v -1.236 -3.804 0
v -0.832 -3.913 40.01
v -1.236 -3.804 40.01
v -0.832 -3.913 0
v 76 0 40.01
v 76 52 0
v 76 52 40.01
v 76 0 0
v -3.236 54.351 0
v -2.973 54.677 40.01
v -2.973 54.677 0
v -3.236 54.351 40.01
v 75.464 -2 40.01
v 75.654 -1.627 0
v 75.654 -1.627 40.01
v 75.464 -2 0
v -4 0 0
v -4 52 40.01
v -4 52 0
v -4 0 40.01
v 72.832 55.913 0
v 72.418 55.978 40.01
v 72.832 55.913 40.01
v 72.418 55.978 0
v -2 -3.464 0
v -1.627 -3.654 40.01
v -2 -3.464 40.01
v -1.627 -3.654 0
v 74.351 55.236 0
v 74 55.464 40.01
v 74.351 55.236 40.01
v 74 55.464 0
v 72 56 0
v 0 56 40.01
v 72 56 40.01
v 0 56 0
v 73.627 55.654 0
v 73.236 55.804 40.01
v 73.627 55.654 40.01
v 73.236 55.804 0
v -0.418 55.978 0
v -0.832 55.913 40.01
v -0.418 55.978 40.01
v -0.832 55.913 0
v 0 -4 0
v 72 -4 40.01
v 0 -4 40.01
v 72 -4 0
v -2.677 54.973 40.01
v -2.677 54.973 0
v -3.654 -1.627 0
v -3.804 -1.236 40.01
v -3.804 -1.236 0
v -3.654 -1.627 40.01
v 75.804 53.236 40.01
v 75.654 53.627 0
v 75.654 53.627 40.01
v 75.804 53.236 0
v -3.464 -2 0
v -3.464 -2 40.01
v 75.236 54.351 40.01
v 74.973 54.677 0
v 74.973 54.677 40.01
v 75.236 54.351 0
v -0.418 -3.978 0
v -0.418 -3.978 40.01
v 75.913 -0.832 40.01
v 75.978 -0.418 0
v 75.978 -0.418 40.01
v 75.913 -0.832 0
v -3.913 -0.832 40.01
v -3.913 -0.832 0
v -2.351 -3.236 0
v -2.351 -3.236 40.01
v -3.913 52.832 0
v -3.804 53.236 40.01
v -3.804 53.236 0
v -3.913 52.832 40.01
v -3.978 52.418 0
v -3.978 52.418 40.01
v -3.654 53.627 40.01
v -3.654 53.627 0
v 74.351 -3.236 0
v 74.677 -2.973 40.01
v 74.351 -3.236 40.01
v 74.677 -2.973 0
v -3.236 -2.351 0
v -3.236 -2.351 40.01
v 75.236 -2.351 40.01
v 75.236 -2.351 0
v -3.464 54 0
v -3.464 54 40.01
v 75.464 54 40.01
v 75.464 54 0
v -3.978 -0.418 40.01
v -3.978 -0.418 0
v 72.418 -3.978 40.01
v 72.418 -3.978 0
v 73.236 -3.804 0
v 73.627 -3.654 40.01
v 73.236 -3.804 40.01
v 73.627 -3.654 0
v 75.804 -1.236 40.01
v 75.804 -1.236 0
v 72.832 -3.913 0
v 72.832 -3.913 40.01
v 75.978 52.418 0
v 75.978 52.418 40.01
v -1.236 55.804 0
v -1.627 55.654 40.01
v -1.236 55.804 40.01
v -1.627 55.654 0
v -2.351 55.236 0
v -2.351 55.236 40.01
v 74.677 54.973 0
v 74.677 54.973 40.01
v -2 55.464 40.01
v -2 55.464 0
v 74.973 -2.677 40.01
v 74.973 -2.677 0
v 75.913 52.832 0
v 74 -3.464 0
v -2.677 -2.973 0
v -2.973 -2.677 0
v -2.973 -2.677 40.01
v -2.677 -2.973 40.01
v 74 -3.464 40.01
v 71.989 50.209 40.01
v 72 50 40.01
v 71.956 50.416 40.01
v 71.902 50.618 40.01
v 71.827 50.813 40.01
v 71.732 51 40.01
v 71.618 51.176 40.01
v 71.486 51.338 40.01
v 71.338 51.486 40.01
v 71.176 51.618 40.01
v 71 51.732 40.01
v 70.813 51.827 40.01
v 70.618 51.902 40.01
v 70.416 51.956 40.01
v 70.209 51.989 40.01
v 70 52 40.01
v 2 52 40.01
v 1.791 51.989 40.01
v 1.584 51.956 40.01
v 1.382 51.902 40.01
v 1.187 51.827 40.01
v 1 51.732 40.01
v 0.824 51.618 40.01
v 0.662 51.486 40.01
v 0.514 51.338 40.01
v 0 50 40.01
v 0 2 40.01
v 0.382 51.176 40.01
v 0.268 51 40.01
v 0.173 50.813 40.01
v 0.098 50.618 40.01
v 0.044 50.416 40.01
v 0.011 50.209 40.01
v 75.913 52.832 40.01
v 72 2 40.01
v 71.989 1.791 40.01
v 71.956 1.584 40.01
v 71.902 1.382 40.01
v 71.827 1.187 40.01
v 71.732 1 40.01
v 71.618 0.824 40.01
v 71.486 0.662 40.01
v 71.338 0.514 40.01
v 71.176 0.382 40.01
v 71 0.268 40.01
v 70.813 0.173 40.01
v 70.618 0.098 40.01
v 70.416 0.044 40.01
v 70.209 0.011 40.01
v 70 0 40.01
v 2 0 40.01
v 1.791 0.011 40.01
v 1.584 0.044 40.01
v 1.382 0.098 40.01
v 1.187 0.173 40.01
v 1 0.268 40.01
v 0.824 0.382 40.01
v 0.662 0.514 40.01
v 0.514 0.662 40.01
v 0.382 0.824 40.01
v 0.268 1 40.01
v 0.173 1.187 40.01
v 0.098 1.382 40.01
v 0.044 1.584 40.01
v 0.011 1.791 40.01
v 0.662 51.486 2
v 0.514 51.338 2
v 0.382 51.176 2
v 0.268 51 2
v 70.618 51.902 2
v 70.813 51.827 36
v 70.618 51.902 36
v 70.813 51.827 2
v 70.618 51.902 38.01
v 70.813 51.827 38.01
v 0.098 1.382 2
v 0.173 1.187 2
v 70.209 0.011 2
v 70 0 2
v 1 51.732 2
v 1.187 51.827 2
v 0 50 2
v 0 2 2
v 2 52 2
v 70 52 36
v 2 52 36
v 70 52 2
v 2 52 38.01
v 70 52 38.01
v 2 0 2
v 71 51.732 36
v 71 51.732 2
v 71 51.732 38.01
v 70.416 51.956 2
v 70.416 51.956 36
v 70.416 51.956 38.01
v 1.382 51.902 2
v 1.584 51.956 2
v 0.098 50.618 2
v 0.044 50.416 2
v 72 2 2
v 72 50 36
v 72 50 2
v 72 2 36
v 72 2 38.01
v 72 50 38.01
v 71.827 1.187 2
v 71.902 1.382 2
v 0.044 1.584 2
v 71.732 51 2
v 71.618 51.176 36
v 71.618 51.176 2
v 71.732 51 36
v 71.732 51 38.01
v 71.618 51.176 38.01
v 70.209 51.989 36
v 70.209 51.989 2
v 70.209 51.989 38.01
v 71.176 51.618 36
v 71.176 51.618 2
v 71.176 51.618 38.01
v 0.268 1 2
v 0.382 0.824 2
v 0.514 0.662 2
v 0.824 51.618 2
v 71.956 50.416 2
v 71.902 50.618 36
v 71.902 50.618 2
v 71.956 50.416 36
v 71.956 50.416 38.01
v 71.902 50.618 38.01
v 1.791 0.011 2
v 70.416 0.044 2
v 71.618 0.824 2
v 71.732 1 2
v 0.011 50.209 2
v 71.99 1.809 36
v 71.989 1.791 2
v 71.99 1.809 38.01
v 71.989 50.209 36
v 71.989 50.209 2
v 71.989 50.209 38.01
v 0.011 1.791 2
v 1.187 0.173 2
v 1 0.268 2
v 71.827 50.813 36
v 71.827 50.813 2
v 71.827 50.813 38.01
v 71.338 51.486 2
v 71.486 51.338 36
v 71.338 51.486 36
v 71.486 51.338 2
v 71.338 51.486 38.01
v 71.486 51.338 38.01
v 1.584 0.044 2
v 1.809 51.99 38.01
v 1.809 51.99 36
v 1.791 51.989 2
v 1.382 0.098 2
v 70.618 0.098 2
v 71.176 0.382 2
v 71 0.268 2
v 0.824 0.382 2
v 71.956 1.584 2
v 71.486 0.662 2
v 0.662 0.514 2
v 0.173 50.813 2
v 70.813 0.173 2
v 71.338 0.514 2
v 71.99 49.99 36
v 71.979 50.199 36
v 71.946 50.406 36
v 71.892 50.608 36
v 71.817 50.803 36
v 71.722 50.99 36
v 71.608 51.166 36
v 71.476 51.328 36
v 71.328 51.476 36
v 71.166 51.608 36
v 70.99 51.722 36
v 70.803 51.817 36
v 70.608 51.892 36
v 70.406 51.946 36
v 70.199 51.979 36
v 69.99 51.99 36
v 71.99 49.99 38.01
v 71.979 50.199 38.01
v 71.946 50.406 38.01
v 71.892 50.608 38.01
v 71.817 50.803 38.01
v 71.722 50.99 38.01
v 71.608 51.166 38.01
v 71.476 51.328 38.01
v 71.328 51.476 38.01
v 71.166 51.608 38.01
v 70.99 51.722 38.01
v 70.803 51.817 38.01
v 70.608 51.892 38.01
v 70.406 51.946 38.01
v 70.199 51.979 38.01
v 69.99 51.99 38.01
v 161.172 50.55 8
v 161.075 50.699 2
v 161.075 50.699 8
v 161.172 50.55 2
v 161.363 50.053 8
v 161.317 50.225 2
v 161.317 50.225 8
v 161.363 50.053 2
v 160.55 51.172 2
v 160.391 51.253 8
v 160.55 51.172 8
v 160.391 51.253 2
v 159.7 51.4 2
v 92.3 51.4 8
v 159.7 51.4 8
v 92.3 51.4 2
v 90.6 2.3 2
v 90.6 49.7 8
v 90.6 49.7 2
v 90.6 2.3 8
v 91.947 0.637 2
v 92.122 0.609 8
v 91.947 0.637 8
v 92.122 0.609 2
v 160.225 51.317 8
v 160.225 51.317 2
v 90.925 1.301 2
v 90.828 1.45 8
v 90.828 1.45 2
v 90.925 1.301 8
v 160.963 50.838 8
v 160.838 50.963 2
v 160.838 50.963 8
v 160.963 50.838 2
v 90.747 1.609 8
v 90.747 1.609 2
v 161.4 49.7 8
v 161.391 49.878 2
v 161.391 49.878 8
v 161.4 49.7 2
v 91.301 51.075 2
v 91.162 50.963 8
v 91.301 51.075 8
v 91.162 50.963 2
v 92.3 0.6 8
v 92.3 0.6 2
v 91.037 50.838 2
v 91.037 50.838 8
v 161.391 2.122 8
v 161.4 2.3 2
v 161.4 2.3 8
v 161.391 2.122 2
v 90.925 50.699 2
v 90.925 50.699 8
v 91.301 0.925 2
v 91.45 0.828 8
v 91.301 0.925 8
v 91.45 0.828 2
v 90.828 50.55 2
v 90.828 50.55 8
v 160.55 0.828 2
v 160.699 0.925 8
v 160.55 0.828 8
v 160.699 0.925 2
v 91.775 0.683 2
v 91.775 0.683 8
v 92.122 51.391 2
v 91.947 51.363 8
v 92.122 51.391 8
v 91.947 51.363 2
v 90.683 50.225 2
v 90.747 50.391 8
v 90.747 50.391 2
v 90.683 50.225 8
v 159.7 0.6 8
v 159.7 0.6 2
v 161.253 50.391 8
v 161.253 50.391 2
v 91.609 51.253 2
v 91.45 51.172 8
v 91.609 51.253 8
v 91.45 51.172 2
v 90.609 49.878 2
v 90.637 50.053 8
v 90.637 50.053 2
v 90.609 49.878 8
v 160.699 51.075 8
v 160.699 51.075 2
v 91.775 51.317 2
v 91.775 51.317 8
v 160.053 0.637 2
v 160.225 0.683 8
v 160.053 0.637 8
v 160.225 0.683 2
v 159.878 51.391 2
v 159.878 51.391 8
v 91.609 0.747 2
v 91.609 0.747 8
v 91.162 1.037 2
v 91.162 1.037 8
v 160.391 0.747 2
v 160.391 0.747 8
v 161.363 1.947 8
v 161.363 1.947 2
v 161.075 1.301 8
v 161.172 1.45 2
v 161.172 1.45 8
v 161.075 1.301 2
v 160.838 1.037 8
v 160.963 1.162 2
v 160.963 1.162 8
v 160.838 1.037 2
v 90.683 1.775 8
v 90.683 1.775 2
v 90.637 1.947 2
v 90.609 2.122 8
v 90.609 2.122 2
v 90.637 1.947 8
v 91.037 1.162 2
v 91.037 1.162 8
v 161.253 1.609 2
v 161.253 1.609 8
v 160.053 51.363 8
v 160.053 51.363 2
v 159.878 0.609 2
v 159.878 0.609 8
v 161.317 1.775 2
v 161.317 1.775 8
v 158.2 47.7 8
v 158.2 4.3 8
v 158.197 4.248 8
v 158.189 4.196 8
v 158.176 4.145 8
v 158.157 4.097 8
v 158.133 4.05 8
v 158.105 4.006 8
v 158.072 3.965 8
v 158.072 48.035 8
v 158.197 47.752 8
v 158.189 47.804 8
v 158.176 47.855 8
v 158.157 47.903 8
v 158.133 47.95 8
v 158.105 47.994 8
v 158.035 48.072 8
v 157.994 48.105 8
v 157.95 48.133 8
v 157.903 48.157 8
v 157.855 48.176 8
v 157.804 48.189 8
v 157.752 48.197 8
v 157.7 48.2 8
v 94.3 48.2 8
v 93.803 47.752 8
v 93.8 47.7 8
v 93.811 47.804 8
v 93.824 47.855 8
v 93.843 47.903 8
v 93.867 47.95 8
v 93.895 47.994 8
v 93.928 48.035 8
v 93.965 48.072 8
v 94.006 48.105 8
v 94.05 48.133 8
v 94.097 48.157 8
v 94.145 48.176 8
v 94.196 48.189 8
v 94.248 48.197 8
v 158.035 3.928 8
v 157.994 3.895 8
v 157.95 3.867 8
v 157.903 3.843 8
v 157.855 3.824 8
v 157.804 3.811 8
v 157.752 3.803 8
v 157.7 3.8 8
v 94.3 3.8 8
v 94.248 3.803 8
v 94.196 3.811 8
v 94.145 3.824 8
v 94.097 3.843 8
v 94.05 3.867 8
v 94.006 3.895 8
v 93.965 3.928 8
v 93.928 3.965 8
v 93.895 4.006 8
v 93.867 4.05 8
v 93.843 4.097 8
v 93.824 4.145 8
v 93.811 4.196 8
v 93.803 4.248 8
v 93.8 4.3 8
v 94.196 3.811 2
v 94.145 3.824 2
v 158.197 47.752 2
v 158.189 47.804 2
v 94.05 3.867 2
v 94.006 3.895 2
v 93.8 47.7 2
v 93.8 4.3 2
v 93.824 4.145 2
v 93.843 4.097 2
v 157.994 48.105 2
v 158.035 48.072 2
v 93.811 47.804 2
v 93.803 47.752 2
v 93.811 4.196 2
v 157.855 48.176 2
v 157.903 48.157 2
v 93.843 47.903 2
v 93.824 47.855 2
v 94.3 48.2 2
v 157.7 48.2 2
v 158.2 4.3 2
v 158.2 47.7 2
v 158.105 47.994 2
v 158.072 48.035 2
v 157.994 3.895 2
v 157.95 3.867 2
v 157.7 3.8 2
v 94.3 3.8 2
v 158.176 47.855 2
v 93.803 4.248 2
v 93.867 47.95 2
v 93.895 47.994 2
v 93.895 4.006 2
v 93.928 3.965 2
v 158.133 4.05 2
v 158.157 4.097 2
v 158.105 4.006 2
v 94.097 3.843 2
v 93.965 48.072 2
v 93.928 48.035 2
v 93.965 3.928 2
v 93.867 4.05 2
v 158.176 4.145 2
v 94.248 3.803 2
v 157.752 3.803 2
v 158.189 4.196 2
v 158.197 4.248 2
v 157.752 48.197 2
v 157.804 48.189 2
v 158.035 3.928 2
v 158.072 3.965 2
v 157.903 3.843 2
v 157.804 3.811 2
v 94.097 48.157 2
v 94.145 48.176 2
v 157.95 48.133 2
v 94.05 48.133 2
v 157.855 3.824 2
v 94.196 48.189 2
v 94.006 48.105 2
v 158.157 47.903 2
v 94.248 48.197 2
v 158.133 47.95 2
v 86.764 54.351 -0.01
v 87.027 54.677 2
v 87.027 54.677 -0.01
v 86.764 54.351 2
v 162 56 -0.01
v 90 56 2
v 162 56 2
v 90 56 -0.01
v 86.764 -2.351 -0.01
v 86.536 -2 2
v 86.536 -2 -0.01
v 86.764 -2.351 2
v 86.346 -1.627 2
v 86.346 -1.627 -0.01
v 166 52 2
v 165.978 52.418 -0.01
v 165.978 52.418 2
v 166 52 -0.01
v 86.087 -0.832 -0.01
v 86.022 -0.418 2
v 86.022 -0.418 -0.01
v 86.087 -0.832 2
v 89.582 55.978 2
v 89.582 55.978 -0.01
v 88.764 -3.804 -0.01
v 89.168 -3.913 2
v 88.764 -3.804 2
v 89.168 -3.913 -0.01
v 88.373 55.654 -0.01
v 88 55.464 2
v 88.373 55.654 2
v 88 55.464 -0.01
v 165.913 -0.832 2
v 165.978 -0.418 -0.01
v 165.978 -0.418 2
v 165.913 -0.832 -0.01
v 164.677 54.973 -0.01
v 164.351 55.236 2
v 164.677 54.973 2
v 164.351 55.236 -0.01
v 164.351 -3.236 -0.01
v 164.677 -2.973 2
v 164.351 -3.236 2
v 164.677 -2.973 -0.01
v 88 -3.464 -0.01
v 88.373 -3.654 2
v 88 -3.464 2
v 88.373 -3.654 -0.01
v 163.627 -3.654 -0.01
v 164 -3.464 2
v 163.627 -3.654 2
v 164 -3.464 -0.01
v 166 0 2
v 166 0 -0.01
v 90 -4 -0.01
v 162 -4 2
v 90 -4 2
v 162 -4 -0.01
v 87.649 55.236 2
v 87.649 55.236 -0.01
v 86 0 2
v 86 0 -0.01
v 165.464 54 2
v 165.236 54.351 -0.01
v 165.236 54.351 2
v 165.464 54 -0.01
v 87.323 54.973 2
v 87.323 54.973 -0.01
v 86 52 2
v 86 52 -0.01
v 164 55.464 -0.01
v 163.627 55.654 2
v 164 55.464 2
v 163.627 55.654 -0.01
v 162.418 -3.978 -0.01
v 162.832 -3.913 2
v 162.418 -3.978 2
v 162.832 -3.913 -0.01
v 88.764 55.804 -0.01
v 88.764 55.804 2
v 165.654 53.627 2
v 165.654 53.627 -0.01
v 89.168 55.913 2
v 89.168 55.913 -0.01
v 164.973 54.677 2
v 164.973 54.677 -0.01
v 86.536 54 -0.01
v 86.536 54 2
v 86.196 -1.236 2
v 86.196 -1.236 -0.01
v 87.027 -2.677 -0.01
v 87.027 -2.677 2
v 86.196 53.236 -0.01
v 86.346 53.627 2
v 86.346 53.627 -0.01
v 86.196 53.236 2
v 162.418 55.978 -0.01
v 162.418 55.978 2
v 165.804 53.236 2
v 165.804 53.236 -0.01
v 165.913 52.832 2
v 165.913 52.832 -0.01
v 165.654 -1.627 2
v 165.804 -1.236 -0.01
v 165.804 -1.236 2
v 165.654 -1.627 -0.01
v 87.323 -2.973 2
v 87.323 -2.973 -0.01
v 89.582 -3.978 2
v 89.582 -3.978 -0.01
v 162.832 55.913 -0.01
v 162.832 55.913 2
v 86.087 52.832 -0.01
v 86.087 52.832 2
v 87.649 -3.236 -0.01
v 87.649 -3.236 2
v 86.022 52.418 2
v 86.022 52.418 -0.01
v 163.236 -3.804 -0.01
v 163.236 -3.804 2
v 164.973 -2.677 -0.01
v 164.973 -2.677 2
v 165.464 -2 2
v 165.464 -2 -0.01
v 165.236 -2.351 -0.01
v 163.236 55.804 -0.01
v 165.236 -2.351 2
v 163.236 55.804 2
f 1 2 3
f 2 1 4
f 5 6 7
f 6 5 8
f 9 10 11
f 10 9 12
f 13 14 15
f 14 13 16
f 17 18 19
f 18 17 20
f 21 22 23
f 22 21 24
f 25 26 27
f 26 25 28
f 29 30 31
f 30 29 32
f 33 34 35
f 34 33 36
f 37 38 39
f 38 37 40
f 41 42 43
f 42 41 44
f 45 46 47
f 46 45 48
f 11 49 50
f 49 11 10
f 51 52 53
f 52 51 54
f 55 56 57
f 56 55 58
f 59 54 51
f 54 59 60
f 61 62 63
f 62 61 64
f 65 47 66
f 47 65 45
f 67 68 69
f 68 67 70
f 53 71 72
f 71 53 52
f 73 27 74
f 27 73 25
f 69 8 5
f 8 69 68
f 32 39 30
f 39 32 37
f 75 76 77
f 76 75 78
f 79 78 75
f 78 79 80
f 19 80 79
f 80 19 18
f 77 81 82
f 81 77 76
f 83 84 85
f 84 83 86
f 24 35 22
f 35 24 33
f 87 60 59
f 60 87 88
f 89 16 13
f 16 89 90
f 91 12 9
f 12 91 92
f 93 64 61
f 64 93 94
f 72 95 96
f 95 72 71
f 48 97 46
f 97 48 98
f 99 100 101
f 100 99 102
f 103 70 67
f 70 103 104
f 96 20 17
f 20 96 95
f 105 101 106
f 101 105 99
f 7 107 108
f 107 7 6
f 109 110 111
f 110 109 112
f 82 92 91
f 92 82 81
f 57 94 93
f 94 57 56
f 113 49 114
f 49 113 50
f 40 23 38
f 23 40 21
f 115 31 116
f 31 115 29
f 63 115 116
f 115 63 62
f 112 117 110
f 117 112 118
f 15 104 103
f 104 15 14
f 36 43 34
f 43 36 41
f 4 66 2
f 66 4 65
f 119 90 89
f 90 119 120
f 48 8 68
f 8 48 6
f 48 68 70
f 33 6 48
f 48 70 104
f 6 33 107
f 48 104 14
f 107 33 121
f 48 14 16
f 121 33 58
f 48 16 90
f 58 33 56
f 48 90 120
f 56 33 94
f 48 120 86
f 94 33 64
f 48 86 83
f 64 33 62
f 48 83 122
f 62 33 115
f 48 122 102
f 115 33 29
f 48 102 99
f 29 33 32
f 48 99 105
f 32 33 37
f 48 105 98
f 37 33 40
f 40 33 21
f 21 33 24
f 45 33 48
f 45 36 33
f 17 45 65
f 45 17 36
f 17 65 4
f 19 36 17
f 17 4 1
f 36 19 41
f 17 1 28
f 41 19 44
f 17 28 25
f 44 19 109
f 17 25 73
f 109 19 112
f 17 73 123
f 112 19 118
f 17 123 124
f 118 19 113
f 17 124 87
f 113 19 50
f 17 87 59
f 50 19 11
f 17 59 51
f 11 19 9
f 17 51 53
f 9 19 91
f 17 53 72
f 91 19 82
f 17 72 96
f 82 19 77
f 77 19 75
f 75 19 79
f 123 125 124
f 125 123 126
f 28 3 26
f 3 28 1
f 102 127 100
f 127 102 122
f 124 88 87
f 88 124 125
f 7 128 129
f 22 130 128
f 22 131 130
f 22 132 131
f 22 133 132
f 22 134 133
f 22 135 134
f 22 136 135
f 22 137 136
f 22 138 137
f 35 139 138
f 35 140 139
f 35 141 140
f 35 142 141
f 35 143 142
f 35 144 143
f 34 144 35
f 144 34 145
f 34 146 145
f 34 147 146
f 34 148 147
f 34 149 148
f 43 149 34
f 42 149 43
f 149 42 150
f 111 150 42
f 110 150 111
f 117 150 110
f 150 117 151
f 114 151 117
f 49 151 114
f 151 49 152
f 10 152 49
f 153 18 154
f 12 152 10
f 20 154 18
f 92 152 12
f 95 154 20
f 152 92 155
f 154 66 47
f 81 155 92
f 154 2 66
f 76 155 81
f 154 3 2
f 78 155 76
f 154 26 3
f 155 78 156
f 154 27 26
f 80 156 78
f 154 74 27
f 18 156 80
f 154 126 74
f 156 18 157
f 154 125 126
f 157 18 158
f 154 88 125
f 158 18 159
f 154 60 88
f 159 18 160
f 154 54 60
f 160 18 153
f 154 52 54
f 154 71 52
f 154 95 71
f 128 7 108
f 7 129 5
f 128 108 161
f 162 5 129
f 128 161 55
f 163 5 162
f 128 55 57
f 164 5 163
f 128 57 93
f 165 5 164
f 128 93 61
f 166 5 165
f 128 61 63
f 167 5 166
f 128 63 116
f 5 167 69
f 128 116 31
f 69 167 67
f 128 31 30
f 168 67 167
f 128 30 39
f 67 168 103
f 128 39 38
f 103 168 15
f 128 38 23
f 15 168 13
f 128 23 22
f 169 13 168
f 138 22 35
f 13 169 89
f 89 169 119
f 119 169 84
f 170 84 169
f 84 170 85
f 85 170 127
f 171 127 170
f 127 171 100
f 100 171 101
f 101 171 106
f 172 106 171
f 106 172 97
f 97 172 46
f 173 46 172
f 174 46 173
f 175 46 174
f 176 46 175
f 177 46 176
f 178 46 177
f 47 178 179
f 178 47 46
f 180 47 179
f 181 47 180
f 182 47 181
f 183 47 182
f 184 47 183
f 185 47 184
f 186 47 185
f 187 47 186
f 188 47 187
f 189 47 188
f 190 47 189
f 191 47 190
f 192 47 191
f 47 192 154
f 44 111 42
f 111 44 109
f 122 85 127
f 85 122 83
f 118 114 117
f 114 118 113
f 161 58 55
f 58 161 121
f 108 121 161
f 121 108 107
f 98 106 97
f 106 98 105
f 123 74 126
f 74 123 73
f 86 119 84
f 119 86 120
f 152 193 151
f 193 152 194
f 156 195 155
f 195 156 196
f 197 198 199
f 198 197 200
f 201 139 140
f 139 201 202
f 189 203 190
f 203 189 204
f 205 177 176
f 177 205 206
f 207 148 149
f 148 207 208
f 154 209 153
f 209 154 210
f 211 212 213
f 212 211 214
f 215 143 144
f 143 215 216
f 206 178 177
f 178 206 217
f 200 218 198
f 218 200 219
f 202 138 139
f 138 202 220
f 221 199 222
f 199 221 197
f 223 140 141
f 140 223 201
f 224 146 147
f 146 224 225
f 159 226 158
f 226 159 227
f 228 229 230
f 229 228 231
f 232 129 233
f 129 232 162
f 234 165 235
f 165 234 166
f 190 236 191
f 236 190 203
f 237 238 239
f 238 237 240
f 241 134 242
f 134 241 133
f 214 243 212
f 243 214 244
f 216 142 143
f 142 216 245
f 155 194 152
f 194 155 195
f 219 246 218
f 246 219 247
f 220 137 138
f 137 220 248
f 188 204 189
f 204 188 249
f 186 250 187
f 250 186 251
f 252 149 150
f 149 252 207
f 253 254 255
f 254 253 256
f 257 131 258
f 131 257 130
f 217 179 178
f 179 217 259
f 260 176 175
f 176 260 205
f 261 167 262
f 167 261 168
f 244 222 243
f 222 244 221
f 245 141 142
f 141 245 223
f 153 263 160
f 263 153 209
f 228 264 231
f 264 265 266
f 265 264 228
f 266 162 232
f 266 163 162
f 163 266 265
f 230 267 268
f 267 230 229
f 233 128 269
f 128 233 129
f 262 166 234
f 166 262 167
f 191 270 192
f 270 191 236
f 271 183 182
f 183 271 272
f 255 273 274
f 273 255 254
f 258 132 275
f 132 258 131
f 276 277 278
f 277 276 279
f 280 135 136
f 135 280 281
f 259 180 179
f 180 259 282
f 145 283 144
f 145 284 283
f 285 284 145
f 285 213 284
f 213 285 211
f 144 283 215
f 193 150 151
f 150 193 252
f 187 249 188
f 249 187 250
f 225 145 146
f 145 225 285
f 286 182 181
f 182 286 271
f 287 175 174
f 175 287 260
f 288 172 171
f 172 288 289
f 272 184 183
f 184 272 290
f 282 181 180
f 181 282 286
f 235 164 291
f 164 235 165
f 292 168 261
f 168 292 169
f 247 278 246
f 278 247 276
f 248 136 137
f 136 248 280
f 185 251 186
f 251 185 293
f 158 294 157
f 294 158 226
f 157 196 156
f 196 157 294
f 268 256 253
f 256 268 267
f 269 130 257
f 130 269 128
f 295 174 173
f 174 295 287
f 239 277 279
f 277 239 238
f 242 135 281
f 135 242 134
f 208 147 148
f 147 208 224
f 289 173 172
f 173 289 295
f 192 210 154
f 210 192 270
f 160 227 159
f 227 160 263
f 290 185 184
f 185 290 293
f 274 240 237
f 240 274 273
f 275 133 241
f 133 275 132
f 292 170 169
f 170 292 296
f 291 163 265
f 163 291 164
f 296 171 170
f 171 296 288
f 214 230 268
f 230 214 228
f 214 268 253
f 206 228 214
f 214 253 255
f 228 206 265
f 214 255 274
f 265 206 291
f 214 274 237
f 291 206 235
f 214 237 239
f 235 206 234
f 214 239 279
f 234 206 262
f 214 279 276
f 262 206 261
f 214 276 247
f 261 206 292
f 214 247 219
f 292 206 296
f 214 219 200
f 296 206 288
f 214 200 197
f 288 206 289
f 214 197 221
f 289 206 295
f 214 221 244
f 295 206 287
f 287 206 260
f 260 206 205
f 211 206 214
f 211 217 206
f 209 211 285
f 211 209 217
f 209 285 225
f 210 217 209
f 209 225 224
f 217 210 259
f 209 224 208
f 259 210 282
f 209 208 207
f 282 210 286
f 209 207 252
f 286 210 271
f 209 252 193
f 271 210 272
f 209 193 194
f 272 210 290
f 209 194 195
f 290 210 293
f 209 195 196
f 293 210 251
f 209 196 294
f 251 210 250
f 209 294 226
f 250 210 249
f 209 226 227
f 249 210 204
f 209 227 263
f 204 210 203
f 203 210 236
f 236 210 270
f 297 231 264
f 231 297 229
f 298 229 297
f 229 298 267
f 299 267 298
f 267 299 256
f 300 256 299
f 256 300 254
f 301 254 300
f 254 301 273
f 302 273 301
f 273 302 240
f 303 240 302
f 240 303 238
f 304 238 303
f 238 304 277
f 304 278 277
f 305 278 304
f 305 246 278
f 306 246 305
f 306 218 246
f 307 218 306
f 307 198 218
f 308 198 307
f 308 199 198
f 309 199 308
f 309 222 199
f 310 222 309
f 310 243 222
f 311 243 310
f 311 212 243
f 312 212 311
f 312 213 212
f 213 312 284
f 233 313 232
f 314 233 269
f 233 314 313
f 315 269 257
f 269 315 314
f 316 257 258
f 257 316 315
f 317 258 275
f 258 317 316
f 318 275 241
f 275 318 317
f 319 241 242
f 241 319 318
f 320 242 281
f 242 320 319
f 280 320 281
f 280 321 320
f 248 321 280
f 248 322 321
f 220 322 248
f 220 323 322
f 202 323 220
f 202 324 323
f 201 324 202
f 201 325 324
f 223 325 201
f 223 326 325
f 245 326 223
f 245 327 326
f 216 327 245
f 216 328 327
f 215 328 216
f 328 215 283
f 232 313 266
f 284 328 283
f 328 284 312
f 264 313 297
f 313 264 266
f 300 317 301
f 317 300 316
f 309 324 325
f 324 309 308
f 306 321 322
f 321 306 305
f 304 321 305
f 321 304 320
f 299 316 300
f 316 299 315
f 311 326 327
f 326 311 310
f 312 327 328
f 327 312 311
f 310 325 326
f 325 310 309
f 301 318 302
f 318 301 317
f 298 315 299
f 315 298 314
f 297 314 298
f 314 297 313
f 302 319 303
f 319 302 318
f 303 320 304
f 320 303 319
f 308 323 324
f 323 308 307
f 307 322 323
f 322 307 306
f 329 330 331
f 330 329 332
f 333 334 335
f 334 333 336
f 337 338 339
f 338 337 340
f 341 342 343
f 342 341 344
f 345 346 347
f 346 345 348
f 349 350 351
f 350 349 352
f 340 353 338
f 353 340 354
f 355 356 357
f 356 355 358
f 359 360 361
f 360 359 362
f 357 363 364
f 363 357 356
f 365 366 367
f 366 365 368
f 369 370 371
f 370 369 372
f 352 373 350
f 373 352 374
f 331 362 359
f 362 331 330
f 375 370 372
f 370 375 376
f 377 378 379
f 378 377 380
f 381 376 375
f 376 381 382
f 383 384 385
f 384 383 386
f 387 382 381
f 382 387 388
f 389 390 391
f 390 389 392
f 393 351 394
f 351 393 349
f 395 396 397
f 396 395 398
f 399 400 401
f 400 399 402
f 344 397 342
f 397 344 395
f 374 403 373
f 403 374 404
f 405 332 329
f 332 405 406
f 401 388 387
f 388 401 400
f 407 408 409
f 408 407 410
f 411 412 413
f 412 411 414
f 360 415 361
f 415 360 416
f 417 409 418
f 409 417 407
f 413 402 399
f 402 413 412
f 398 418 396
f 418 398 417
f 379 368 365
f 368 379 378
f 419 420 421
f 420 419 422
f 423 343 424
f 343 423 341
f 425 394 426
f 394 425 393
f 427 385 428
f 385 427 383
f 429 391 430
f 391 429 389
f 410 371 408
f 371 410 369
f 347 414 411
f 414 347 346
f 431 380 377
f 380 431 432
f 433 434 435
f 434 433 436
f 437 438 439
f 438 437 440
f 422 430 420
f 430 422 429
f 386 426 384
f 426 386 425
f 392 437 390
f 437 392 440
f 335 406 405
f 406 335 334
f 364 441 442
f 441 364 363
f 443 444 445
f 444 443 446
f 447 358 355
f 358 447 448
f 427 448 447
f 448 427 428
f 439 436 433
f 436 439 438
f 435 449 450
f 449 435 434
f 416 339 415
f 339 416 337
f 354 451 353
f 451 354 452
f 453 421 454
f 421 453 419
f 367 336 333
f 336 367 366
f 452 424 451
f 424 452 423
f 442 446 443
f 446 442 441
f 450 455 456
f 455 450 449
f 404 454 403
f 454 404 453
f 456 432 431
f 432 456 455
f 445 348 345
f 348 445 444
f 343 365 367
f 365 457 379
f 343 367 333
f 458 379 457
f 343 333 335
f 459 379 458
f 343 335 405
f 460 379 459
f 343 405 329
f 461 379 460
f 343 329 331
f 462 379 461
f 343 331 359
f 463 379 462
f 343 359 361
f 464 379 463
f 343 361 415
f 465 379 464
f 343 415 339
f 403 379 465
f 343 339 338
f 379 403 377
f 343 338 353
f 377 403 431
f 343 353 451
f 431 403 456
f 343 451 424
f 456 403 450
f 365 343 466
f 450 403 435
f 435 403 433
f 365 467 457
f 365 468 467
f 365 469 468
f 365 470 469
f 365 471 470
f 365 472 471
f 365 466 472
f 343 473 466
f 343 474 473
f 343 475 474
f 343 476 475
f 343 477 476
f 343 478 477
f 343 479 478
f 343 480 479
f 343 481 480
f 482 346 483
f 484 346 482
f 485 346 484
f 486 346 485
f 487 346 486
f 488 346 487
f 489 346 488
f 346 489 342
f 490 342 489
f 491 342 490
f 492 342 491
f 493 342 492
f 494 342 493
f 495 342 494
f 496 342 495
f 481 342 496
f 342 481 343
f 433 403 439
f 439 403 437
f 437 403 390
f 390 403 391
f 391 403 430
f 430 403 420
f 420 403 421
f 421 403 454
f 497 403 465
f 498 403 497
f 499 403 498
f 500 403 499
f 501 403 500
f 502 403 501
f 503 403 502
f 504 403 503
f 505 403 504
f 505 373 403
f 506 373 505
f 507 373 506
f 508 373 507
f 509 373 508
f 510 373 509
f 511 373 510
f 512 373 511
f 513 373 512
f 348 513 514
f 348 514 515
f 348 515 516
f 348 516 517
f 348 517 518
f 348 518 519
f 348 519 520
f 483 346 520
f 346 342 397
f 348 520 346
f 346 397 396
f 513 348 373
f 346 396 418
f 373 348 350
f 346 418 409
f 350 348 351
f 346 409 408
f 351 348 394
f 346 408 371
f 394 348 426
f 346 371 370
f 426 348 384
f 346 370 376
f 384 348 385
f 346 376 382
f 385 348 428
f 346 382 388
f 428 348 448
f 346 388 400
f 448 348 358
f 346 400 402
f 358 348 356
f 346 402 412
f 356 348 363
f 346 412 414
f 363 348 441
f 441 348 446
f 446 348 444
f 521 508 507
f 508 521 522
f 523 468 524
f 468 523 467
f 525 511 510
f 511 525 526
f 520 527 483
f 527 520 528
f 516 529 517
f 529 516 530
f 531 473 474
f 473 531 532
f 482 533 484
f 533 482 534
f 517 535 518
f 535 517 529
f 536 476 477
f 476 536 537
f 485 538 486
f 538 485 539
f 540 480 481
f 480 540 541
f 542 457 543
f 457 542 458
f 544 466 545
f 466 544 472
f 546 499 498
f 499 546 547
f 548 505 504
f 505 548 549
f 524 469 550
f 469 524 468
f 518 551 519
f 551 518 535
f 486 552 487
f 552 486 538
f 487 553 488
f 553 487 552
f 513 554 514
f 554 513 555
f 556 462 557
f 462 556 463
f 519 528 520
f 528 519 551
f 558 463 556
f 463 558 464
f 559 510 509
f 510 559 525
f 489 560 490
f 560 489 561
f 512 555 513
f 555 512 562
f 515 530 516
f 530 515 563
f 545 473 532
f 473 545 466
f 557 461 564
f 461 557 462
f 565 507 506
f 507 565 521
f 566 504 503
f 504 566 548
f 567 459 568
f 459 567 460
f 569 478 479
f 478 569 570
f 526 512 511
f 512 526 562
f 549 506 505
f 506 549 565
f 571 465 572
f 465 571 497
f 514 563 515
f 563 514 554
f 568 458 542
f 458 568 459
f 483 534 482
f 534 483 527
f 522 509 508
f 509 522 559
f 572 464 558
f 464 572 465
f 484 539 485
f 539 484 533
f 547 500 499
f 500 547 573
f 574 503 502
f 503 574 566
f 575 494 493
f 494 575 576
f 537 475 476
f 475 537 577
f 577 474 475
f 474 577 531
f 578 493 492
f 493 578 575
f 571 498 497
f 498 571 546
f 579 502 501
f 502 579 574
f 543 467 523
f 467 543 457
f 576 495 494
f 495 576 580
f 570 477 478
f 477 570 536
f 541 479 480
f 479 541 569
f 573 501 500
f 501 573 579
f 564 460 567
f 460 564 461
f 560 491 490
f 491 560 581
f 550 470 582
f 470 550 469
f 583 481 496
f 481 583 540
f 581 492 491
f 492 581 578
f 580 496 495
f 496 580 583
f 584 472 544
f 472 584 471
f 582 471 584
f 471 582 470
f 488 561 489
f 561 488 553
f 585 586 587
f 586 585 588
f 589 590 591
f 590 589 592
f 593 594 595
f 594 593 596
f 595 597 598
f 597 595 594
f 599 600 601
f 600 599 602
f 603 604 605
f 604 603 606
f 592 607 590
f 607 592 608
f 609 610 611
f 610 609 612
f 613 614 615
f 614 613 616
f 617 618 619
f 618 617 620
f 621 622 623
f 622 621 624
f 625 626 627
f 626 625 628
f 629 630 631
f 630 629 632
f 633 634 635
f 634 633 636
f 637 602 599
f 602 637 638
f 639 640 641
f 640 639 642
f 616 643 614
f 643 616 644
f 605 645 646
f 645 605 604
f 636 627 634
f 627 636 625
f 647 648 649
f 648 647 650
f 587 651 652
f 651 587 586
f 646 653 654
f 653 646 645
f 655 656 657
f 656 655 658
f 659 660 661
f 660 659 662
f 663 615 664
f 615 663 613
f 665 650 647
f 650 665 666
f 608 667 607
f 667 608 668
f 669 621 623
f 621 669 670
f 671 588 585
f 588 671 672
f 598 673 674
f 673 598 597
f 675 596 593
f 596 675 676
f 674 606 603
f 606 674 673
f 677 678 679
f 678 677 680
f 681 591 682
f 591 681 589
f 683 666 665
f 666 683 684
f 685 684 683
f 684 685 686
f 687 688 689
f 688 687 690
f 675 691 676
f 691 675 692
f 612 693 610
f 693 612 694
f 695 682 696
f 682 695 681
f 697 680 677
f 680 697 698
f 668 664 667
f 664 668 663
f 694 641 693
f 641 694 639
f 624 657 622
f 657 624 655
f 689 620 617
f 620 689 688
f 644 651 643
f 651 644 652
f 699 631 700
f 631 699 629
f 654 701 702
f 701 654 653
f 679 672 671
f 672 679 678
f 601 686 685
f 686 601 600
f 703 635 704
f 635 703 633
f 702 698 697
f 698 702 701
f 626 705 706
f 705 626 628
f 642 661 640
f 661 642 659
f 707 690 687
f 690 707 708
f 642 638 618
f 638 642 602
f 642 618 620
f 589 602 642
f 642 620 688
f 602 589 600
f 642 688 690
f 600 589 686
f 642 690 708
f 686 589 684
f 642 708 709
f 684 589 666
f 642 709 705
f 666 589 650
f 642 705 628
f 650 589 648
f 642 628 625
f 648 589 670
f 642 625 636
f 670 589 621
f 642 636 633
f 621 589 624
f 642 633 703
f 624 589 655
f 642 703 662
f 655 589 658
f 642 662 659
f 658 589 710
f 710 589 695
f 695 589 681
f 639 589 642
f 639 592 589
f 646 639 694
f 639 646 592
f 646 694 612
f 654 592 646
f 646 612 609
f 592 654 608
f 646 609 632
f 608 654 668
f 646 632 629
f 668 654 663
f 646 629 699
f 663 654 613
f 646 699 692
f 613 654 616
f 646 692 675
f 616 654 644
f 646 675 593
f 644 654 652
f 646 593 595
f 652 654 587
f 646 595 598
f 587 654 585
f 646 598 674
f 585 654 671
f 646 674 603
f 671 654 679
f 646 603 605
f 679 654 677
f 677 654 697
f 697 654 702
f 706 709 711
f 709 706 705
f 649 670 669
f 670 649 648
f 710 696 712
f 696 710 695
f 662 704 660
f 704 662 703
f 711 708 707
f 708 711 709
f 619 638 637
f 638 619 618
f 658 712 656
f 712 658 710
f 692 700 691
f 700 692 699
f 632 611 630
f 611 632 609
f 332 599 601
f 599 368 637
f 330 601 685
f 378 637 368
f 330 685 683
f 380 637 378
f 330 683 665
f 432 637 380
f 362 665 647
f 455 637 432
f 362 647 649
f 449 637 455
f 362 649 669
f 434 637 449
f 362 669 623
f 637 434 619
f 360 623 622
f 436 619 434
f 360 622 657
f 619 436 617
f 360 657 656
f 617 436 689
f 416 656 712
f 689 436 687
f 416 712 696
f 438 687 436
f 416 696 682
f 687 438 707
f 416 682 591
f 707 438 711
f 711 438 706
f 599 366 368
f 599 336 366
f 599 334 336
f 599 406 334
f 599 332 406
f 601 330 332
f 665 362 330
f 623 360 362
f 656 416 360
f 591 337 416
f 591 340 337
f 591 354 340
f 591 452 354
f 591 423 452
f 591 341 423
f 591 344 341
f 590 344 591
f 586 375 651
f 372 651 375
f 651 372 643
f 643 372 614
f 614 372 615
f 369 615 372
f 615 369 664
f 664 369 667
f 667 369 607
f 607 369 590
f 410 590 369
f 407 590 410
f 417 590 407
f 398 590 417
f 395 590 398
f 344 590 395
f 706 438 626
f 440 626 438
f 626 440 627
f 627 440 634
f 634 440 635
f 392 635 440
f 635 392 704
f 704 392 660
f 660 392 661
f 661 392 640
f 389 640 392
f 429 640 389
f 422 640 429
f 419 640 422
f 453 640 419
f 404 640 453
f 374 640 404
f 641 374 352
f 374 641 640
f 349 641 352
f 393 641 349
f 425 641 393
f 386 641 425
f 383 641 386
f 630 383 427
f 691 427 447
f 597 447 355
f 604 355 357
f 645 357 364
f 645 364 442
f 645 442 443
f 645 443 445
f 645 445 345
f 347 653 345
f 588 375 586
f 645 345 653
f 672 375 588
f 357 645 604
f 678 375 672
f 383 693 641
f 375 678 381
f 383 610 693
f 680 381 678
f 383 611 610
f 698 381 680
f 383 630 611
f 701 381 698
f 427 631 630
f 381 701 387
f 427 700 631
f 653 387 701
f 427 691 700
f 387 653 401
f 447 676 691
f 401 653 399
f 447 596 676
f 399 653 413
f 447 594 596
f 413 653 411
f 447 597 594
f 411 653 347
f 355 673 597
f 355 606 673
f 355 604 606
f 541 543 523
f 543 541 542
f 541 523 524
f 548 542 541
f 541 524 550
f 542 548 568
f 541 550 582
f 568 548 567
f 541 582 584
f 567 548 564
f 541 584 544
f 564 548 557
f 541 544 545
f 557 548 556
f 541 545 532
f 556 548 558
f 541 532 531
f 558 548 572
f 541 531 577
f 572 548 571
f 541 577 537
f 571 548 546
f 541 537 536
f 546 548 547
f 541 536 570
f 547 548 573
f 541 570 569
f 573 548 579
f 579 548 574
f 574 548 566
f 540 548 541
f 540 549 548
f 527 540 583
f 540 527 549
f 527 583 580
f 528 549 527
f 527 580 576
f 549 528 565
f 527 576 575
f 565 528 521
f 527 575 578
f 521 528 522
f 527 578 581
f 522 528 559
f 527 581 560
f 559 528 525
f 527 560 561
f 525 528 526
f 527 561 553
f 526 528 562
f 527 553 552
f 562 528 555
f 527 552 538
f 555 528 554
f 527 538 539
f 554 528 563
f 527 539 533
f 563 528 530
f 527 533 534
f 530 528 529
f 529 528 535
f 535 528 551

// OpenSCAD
// =============================================================================
// Parametric Box with Snap-Fit Lid
// =============================================================================
// Description : A fully parametric box with rounded corners (via minkowski),
//               configurable wall thickness, and a snap-fit lid.
// Author      : 3D LLM Generator
// License     : MIT
//
// Print Settings (FDM):
//   Layer Height : 0.2 mm
//   Infill       : 15-20%
//   Supports     : Not required
//   Material     : PLA or PETG
//   Nozzle       : 0.4 mm
//   Orientation  : Print box upright, lid upside-down
//   Notes        : For tighter snap fit, reduce snap_tolerance to 0.1
// =============================================================================

// ─── Parameters ──────────────────────────────────────────────────────────────

// Outer dimensions of the box (before rounding)
box_width  = 80;   // [30:200] X-axis dimension in mm
box_depth  = 60;   // [30:200] Y-axis dimension in mm
box_height = 40;   // [15:150] Z-axis total height in mm

// Wall and structural settings
wall_thickness  = 2.0;   // [1.2:0.2:4.0] Wall thickness in mm
corner_radius   = 4.0;   // [0:0.5:15]    Radius for rounded corners
bottom_thickness = 2.0;  // [1.2:0.2:4.0] Bottom plate thickness

// Lid settings
lid_height       = 8;    // [5:30]   Height of the lid
lid_tolerance    = 0.3;  // [0.1:0.05:0.6] Gap between lid and box walls
snap_depth       = 1.0;  // [0.5:0.1:2.0]  Depth of snap-fit ridge
snap_height      = 2.0;  // [1.0:0.5:4.0]  Height of snap-fit ridge

// Layout
part_spacing = 10;  // Space between box and lid when rendering both

// Which part to render
render_part = "both"; // ["box", "lid", "both"]

// Resolution
$fn = 60;

// ─── Derived Values ──────────────────────────────────────────────────────────

// Inner dimensions account for wall thickness and corner rounding
inner_width  = box_width  - 2 * wall_thickness - 2 * corner_radius;
inner_depth  = box_depth  - 2 * wall_thickness - 2 * corner_radius;
inner_height = box_height - bottom_thickness;

// Lid inner lip dimensions (slightly smaller to fit inside the box)
lip_width  = inner_width  - 2 * lid_tolerance;
lip_depth  = inner_depth  - 2 * lid_tolerance;
lip_height = lid_height   - wall_thickness;

// ─── Modules ─────────────────────────────────────────────────────────────────

// Rounded rectangle primitive using minkowski sum of a cube and cylinder.
// The minkowski of a thin cube + cylinder produces a shape with rounded
// vertical edges. We keep corners sharp on Z to ensure flat top/bottom.
module rounded_rect(w, d, h, r) {
    minkowski() {
        cube([w, d, h]);
        cylinder(r = r, h = 0.01);  // Tiny height so it doesn't add to Z
    }
}

// Main box body: a rounded shell open at the top
module box_body() {
    difference() {
        // Outer shell
        rounded_rect(
            box_width - 2 * corner_radius,
            box_depth - 2 * corner_radius,
            box_height,
            corner_radius
        );

        // Inner cavity — shifted up by bottom_thickness to leave a solid floor
        translate([wall_thickness, wall_thickness, bottom_thickness])
            rounded_rect(
                inner_width,
                inner_depth,
                inner_height + 1,  // +1 to cleanly open the top
                max(corner_radius - wall_thickness, 0.5)
            );
    }
}

// Snap-fit ridge that runs around the inner perimeter near the top of the box.
// The lid clicks over this ridge to hold in place.
module snap_ridge() {
    ridge_inset = wall_thickness / 2;
    ridge_z     = box_height - snap_height - 2;

    translate([ridge_inset, ridge_inset, ridge_z])
        difference() {
            rounded_rect(
                box_width - 2 * corner_radius - 2 * ridge_inset + snap_depth,
                box_depth - 2 * corner_radius - 2 * ridge_inset + snap_depth,
                snap_height,
                max(corner_radius - ridge_inset, 0.5)
            );
            translate([-0.01, -0.01, -0.01])
                rounded_rect(
                    box_width - 2 * corner_radius - 2 * ridge_inset - snap_depth,
                    box_depth - 2 * corner_radius - 2 * ridge_inset - snap_depth,
                    snap_height + 0.02,
                    max(corner_radius - ridge_inset - snap_depth, 0.5)
                );
        }
}

// Complete box assembly (body + snap ridge)
module box() {
    box_body();
    snap_ridge();
}

// Lid: a flat top with an inner lip that fits inside the box opening,
// and a groove that clicks over the snap ridge.
module lid() {
    inner_r = max(corner_radius - wall_thickness - lid_tolerance, 0.5);

    // Lid top plate
    rounded_rect(
        box_width - 2 * corner_radius,
        box_depth - 2 * corner_radius,
        wall_thickness,
        corner_radius
    );

    // Inner lip that drops into the box
    translate([wall_thickness + lid_tolerance, wall_thickness + lid_tolerance, -lip_height])
        difference() {
            rounded_rect(lip_width, lip_depth, lip_height, inner_r);

            // Hollow out the lip to save material
            translate([wall_thickness, wall_thickness, -0.01])
                rounded_rect(
                    lip_width - 2 * wall_thickness,
                    lip_depth - 2 * wall_thickness,
                    lip_height + 0.02,
                    max(inner_r - wall_thickness, 0.5)
                );
        }
}

// ─── Rendering ───────────────────────────────────────────────────────────────

if (render_part == "box" || render_part == "both") {
    color("SteelBlue", 0.9)
        box();
}

if (render_part == "lid" || render_part == "both") {
    // Position the lid next to the box, flipped for printing orientation
    translate([render_part == "both" ? box_width + part_spacing : 0, 0, 0])
        color("CornflowerBlue", 0.9)
            // Flip the lid upside-down for print orientation
            translate([0, 0, wall_thickness])
                mirror([0, 0, 1])
                    lid();
}
